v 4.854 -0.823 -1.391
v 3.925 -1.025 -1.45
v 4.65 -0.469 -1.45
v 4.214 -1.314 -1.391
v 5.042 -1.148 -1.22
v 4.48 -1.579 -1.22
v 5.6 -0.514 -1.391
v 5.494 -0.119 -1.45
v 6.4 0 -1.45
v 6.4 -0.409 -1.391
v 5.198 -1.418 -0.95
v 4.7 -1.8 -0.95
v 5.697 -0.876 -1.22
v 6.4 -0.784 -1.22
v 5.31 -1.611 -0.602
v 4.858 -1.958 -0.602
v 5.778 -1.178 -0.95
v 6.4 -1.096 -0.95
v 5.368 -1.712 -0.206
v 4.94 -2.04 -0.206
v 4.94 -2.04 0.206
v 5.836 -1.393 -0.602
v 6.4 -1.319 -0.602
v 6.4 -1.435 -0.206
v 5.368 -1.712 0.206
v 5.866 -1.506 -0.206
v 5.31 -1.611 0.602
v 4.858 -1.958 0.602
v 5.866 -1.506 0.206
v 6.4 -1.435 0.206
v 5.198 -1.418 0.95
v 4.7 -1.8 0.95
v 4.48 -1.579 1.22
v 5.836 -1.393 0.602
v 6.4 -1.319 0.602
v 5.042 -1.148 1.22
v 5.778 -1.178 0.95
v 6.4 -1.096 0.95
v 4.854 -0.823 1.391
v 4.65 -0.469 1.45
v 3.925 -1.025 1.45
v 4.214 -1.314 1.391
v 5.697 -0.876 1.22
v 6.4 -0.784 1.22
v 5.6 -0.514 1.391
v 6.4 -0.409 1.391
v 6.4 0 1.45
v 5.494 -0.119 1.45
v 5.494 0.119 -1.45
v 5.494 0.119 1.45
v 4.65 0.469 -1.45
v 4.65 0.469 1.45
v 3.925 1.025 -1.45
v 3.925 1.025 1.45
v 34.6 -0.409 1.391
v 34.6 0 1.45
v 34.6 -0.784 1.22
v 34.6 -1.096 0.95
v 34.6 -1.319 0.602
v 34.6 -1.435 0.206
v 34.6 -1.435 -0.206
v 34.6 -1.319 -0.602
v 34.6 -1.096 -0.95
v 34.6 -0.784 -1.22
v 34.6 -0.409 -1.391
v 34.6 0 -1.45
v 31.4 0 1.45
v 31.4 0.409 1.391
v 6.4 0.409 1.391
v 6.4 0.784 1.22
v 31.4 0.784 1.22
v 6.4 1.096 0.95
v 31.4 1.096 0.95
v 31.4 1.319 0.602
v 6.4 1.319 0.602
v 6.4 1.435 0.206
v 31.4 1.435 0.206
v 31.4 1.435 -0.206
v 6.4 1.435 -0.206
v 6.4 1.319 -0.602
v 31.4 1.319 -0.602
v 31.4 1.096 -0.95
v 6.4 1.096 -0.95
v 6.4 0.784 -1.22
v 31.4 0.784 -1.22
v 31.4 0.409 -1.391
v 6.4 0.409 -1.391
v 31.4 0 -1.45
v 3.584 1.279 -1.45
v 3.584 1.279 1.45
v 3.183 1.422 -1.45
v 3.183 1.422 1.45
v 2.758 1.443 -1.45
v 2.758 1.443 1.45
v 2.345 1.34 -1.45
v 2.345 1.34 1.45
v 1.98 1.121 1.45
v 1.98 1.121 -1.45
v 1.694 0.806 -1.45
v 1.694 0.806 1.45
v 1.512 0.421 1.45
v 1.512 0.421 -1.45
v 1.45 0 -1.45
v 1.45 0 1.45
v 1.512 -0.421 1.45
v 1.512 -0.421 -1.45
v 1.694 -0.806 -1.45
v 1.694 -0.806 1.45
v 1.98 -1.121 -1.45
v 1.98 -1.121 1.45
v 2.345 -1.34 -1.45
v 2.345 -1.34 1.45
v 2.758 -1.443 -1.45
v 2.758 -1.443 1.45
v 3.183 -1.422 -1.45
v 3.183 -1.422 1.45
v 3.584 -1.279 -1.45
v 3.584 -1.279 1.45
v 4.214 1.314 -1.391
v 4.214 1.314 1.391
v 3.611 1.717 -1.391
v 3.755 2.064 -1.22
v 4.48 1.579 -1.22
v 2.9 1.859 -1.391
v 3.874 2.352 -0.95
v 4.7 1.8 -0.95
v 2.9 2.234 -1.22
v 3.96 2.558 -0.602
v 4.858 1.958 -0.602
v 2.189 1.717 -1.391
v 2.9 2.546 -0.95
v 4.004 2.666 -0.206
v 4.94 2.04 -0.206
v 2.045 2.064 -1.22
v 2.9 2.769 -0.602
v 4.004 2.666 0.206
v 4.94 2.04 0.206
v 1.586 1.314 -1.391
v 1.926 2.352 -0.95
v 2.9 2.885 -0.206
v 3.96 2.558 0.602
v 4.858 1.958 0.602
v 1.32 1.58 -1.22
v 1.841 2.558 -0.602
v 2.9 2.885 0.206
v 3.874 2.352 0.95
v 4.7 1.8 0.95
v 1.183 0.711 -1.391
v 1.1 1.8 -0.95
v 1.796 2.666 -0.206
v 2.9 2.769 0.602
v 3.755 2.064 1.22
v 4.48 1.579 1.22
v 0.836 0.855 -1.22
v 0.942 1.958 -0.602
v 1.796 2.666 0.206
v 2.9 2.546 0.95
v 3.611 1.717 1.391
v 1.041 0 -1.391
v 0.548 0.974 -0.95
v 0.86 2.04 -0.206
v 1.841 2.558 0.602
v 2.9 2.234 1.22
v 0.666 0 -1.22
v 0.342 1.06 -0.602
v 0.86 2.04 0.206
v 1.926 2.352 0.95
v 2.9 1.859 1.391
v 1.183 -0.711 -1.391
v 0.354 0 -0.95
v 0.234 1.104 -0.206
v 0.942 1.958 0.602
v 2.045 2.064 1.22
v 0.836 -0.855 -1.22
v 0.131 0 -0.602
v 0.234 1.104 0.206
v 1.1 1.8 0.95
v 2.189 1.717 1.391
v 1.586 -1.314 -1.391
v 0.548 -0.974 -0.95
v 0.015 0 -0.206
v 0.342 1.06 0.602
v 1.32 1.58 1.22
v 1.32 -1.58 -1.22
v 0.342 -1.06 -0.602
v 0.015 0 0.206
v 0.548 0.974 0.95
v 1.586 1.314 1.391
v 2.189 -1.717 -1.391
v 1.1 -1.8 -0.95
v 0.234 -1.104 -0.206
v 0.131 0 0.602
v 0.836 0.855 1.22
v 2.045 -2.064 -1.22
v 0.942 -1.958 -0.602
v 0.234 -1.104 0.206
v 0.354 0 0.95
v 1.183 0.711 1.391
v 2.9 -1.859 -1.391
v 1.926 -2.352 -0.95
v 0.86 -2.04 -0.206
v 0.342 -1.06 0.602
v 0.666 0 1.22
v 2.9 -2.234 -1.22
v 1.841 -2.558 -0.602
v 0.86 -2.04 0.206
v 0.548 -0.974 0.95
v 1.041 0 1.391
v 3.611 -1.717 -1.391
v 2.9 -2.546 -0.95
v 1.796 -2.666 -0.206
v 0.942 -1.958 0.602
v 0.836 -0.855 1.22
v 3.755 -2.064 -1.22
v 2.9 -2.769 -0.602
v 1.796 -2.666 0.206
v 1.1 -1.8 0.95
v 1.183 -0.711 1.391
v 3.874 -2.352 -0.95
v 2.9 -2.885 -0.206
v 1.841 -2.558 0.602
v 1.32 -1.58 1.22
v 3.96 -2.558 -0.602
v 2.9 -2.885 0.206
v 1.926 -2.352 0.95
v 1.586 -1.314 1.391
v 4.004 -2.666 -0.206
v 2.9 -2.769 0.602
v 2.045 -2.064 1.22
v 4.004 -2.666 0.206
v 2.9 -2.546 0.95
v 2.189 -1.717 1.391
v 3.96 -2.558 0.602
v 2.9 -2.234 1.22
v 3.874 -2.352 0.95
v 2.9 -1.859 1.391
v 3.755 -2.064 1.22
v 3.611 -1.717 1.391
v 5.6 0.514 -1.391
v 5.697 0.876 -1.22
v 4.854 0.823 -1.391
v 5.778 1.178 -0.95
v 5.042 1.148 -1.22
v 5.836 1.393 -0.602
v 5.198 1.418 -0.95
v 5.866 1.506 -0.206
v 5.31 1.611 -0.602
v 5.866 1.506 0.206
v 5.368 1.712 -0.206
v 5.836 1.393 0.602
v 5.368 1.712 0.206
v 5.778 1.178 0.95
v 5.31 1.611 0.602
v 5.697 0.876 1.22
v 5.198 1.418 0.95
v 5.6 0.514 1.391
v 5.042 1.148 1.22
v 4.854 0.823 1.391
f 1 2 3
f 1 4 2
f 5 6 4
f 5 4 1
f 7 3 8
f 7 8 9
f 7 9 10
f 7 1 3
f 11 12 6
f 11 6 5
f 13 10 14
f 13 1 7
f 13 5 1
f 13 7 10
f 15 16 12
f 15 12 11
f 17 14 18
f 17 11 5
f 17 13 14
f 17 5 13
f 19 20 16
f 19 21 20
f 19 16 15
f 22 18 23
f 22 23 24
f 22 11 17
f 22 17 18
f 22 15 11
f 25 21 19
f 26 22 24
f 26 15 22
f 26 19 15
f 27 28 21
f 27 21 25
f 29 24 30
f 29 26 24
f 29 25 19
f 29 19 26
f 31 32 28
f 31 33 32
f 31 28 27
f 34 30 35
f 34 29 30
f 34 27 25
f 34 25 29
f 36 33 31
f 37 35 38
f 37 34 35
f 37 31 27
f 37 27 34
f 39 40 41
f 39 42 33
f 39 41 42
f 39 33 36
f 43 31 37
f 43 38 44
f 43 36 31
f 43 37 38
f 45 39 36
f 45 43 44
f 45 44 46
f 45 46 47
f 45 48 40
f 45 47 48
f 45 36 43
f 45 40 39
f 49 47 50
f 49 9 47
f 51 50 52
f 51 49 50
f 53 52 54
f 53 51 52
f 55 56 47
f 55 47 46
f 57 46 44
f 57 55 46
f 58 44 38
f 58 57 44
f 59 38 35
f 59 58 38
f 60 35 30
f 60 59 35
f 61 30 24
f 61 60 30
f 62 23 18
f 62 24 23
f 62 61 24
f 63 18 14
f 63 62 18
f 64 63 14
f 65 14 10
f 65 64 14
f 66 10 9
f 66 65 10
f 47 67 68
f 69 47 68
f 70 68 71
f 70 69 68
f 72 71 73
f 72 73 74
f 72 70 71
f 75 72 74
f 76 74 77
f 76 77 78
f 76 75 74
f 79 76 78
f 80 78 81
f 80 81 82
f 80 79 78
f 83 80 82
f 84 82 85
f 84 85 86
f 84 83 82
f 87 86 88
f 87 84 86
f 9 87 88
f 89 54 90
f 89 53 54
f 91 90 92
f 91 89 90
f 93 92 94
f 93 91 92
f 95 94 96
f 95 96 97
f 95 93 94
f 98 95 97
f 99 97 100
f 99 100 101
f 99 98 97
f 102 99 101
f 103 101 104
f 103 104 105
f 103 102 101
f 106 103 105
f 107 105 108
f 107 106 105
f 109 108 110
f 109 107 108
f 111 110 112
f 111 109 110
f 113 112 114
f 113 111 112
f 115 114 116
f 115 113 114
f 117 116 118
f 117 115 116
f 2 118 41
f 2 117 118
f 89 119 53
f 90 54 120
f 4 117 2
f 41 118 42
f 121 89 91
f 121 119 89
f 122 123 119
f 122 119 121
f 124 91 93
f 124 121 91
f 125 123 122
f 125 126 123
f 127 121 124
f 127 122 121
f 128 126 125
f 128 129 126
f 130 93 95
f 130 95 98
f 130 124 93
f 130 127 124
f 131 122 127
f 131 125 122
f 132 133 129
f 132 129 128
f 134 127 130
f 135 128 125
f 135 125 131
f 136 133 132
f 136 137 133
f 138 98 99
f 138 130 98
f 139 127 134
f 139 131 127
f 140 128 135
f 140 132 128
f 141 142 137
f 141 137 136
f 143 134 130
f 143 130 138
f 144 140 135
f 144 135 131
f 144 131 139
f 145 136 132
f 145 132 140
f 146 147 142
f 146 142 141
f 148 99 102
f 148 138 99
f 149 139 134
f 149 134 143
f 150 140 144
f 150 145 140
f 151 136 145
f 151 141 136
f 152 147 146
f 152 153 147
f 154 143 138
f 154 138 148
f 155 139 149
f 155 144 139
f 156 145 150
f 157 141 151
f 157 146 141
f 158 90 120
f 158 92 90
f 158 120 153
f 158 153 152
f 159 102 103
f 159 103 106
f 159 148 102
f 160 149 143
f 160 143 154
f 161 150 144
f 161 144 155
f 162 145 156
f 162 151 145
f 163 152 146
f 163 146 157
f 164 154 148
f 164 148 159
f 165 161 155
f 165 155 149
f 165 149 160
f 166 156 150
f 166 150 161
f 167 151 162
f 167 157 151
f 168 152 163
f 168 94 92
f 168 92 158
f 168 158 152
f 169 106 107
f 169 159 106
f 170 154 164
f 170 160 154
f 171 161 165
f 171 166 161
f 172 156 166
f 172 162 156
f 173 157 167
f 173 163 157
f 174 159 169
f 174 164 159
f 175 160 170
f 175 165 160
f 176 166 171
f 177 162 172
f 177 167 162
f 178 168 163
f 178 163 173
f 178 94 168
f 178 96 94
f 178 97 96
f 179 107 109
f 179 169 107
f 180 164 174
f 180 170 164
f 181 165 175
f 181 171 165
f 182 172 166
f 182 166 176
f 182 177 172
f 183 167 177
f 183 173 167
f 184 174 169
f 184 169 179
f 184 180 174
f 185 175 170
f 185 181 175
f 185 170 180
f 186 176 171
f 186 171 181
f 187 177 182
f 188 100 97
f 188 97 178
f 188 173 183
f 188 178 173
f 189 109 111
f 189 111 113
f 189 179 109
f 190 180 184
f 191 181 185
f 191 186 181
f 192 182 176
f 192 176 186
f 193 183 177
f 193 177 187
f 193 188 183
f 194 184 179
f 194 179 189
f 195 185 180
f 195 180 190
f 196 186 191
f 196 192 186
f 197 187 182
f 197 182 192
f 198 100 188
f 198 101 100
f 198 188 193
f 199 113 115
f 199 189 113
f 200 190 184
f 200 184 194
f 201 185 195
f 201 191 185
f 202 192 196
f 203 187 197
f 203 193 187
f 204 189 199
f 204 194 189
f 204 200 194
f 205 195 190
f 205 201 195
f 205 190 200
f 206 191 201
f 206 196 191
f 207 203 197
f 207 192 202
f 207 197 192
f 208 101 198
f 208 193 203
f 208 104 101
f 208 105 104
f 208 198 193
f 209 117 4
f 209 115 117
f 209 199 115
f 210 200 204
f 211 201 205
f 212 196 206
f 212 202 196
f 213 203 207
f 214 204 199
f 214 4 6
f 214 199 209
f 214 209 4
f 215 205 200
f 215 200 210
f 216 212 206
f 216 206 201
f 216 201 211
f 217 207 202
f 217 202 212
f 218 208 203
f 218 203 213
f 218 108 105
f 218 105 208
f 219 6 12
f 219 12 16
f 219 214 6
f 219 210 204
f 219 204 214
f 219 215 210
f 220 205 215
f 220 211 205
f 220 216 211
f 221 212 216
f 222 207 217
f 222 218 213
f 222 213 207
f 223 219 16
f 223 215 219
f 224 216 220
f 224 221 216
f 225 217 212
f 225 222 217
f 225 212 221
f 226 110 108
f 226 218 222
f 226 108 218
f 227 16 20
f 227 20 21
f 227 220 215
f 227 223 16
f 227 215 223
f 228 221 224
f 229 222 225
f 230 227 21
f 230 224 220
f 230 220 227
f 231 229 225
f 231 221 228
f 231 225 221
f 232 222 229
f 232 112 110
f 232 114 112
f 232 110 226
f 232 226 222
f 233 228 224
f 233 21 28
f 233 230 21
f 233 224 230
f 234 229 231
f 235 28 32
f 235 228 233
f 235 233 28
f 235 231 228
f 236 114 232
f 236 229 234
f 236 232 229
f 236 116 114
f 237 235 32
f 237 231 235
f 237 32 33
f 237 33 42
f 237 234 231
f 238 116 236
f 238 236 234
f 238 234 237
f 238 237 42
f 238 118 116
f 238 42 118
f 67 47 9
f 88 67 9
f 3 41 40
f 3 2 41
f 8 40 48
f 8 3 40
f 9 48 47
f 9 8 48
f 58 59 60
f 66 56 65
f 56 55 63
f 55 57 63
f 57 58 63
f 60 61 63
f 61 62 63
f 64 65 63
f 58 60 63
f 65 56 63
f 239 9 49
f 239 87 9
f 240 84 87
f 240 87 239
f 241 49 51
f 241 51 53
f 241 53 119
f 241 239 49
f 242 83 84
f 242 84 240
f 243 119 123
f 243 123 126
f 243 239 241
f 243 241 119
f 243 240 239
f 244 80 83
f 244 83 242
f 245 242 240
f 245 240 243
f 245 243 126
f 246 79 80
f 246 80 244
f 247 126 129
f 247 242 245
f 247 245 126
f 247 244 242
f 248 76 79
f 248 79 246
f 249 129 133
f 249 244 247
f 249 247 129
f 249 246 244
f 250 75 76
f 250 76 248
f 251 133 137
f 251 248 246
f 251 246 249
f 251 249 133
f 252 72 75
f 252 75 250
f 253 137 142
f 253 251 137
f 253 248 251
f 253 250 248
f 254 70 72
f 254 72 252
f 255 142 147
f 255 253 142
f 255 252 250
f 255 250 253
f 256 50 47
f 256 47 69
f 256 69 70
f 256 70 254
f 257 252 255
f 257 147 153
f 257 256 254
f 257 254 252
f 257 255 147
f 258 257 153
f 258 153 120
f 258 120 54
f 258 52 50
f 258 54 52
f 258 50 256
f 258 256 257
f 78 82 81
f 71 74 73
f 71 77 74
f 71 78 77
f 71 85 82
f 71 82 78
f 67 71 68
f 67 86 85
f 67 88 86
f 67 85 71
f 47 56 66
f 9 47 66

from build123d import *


with BuildPart() as part:
    # Body: sweep along a path in PathSke
    with BuildLine(Plane(origin=(1.207969362, 1.807969362, 0), x_dir=(0, 1, 0), z_dir=(0, 0, 1))) as body_path:
        Line((-0.357969362, -30.192030638), (-0.357969362, -5.192030638))
        ThreePointArc((-0.357969362, -5.192030638), (-0.201939729, -4.407742914), (0.242387718, -3.742892857))
        ThreePointArc((0.242387718, -3.742892857), (-1.807969362, 1.207969362), (-3.858326443, -3.742892857))
        ThreePointArc((-3.858326443, -3.742892857), (-3.413998995, -4.407742914), (-3.257969362, -5.192030638))
        Line((-3.257969362, -5.192030638), (-3.257969362, -33.392030638))
    # SectionSke → Body (sweep)
    with BuildSketch(Plane(origin=(31.4, 0.15, 0.15), x_dir=(0, 1, 0), z_dir=(1, 0, 0))):
        with BuildLine():
            Line((-0.15, -1.6), (-0.15, 1.3))
            ThreePointArc((-0.15, 1.3), (1.3, -0.15), (-0.15, -1.6))
        make_face()
    sweep(path=body_path.line)


solid = part.part
